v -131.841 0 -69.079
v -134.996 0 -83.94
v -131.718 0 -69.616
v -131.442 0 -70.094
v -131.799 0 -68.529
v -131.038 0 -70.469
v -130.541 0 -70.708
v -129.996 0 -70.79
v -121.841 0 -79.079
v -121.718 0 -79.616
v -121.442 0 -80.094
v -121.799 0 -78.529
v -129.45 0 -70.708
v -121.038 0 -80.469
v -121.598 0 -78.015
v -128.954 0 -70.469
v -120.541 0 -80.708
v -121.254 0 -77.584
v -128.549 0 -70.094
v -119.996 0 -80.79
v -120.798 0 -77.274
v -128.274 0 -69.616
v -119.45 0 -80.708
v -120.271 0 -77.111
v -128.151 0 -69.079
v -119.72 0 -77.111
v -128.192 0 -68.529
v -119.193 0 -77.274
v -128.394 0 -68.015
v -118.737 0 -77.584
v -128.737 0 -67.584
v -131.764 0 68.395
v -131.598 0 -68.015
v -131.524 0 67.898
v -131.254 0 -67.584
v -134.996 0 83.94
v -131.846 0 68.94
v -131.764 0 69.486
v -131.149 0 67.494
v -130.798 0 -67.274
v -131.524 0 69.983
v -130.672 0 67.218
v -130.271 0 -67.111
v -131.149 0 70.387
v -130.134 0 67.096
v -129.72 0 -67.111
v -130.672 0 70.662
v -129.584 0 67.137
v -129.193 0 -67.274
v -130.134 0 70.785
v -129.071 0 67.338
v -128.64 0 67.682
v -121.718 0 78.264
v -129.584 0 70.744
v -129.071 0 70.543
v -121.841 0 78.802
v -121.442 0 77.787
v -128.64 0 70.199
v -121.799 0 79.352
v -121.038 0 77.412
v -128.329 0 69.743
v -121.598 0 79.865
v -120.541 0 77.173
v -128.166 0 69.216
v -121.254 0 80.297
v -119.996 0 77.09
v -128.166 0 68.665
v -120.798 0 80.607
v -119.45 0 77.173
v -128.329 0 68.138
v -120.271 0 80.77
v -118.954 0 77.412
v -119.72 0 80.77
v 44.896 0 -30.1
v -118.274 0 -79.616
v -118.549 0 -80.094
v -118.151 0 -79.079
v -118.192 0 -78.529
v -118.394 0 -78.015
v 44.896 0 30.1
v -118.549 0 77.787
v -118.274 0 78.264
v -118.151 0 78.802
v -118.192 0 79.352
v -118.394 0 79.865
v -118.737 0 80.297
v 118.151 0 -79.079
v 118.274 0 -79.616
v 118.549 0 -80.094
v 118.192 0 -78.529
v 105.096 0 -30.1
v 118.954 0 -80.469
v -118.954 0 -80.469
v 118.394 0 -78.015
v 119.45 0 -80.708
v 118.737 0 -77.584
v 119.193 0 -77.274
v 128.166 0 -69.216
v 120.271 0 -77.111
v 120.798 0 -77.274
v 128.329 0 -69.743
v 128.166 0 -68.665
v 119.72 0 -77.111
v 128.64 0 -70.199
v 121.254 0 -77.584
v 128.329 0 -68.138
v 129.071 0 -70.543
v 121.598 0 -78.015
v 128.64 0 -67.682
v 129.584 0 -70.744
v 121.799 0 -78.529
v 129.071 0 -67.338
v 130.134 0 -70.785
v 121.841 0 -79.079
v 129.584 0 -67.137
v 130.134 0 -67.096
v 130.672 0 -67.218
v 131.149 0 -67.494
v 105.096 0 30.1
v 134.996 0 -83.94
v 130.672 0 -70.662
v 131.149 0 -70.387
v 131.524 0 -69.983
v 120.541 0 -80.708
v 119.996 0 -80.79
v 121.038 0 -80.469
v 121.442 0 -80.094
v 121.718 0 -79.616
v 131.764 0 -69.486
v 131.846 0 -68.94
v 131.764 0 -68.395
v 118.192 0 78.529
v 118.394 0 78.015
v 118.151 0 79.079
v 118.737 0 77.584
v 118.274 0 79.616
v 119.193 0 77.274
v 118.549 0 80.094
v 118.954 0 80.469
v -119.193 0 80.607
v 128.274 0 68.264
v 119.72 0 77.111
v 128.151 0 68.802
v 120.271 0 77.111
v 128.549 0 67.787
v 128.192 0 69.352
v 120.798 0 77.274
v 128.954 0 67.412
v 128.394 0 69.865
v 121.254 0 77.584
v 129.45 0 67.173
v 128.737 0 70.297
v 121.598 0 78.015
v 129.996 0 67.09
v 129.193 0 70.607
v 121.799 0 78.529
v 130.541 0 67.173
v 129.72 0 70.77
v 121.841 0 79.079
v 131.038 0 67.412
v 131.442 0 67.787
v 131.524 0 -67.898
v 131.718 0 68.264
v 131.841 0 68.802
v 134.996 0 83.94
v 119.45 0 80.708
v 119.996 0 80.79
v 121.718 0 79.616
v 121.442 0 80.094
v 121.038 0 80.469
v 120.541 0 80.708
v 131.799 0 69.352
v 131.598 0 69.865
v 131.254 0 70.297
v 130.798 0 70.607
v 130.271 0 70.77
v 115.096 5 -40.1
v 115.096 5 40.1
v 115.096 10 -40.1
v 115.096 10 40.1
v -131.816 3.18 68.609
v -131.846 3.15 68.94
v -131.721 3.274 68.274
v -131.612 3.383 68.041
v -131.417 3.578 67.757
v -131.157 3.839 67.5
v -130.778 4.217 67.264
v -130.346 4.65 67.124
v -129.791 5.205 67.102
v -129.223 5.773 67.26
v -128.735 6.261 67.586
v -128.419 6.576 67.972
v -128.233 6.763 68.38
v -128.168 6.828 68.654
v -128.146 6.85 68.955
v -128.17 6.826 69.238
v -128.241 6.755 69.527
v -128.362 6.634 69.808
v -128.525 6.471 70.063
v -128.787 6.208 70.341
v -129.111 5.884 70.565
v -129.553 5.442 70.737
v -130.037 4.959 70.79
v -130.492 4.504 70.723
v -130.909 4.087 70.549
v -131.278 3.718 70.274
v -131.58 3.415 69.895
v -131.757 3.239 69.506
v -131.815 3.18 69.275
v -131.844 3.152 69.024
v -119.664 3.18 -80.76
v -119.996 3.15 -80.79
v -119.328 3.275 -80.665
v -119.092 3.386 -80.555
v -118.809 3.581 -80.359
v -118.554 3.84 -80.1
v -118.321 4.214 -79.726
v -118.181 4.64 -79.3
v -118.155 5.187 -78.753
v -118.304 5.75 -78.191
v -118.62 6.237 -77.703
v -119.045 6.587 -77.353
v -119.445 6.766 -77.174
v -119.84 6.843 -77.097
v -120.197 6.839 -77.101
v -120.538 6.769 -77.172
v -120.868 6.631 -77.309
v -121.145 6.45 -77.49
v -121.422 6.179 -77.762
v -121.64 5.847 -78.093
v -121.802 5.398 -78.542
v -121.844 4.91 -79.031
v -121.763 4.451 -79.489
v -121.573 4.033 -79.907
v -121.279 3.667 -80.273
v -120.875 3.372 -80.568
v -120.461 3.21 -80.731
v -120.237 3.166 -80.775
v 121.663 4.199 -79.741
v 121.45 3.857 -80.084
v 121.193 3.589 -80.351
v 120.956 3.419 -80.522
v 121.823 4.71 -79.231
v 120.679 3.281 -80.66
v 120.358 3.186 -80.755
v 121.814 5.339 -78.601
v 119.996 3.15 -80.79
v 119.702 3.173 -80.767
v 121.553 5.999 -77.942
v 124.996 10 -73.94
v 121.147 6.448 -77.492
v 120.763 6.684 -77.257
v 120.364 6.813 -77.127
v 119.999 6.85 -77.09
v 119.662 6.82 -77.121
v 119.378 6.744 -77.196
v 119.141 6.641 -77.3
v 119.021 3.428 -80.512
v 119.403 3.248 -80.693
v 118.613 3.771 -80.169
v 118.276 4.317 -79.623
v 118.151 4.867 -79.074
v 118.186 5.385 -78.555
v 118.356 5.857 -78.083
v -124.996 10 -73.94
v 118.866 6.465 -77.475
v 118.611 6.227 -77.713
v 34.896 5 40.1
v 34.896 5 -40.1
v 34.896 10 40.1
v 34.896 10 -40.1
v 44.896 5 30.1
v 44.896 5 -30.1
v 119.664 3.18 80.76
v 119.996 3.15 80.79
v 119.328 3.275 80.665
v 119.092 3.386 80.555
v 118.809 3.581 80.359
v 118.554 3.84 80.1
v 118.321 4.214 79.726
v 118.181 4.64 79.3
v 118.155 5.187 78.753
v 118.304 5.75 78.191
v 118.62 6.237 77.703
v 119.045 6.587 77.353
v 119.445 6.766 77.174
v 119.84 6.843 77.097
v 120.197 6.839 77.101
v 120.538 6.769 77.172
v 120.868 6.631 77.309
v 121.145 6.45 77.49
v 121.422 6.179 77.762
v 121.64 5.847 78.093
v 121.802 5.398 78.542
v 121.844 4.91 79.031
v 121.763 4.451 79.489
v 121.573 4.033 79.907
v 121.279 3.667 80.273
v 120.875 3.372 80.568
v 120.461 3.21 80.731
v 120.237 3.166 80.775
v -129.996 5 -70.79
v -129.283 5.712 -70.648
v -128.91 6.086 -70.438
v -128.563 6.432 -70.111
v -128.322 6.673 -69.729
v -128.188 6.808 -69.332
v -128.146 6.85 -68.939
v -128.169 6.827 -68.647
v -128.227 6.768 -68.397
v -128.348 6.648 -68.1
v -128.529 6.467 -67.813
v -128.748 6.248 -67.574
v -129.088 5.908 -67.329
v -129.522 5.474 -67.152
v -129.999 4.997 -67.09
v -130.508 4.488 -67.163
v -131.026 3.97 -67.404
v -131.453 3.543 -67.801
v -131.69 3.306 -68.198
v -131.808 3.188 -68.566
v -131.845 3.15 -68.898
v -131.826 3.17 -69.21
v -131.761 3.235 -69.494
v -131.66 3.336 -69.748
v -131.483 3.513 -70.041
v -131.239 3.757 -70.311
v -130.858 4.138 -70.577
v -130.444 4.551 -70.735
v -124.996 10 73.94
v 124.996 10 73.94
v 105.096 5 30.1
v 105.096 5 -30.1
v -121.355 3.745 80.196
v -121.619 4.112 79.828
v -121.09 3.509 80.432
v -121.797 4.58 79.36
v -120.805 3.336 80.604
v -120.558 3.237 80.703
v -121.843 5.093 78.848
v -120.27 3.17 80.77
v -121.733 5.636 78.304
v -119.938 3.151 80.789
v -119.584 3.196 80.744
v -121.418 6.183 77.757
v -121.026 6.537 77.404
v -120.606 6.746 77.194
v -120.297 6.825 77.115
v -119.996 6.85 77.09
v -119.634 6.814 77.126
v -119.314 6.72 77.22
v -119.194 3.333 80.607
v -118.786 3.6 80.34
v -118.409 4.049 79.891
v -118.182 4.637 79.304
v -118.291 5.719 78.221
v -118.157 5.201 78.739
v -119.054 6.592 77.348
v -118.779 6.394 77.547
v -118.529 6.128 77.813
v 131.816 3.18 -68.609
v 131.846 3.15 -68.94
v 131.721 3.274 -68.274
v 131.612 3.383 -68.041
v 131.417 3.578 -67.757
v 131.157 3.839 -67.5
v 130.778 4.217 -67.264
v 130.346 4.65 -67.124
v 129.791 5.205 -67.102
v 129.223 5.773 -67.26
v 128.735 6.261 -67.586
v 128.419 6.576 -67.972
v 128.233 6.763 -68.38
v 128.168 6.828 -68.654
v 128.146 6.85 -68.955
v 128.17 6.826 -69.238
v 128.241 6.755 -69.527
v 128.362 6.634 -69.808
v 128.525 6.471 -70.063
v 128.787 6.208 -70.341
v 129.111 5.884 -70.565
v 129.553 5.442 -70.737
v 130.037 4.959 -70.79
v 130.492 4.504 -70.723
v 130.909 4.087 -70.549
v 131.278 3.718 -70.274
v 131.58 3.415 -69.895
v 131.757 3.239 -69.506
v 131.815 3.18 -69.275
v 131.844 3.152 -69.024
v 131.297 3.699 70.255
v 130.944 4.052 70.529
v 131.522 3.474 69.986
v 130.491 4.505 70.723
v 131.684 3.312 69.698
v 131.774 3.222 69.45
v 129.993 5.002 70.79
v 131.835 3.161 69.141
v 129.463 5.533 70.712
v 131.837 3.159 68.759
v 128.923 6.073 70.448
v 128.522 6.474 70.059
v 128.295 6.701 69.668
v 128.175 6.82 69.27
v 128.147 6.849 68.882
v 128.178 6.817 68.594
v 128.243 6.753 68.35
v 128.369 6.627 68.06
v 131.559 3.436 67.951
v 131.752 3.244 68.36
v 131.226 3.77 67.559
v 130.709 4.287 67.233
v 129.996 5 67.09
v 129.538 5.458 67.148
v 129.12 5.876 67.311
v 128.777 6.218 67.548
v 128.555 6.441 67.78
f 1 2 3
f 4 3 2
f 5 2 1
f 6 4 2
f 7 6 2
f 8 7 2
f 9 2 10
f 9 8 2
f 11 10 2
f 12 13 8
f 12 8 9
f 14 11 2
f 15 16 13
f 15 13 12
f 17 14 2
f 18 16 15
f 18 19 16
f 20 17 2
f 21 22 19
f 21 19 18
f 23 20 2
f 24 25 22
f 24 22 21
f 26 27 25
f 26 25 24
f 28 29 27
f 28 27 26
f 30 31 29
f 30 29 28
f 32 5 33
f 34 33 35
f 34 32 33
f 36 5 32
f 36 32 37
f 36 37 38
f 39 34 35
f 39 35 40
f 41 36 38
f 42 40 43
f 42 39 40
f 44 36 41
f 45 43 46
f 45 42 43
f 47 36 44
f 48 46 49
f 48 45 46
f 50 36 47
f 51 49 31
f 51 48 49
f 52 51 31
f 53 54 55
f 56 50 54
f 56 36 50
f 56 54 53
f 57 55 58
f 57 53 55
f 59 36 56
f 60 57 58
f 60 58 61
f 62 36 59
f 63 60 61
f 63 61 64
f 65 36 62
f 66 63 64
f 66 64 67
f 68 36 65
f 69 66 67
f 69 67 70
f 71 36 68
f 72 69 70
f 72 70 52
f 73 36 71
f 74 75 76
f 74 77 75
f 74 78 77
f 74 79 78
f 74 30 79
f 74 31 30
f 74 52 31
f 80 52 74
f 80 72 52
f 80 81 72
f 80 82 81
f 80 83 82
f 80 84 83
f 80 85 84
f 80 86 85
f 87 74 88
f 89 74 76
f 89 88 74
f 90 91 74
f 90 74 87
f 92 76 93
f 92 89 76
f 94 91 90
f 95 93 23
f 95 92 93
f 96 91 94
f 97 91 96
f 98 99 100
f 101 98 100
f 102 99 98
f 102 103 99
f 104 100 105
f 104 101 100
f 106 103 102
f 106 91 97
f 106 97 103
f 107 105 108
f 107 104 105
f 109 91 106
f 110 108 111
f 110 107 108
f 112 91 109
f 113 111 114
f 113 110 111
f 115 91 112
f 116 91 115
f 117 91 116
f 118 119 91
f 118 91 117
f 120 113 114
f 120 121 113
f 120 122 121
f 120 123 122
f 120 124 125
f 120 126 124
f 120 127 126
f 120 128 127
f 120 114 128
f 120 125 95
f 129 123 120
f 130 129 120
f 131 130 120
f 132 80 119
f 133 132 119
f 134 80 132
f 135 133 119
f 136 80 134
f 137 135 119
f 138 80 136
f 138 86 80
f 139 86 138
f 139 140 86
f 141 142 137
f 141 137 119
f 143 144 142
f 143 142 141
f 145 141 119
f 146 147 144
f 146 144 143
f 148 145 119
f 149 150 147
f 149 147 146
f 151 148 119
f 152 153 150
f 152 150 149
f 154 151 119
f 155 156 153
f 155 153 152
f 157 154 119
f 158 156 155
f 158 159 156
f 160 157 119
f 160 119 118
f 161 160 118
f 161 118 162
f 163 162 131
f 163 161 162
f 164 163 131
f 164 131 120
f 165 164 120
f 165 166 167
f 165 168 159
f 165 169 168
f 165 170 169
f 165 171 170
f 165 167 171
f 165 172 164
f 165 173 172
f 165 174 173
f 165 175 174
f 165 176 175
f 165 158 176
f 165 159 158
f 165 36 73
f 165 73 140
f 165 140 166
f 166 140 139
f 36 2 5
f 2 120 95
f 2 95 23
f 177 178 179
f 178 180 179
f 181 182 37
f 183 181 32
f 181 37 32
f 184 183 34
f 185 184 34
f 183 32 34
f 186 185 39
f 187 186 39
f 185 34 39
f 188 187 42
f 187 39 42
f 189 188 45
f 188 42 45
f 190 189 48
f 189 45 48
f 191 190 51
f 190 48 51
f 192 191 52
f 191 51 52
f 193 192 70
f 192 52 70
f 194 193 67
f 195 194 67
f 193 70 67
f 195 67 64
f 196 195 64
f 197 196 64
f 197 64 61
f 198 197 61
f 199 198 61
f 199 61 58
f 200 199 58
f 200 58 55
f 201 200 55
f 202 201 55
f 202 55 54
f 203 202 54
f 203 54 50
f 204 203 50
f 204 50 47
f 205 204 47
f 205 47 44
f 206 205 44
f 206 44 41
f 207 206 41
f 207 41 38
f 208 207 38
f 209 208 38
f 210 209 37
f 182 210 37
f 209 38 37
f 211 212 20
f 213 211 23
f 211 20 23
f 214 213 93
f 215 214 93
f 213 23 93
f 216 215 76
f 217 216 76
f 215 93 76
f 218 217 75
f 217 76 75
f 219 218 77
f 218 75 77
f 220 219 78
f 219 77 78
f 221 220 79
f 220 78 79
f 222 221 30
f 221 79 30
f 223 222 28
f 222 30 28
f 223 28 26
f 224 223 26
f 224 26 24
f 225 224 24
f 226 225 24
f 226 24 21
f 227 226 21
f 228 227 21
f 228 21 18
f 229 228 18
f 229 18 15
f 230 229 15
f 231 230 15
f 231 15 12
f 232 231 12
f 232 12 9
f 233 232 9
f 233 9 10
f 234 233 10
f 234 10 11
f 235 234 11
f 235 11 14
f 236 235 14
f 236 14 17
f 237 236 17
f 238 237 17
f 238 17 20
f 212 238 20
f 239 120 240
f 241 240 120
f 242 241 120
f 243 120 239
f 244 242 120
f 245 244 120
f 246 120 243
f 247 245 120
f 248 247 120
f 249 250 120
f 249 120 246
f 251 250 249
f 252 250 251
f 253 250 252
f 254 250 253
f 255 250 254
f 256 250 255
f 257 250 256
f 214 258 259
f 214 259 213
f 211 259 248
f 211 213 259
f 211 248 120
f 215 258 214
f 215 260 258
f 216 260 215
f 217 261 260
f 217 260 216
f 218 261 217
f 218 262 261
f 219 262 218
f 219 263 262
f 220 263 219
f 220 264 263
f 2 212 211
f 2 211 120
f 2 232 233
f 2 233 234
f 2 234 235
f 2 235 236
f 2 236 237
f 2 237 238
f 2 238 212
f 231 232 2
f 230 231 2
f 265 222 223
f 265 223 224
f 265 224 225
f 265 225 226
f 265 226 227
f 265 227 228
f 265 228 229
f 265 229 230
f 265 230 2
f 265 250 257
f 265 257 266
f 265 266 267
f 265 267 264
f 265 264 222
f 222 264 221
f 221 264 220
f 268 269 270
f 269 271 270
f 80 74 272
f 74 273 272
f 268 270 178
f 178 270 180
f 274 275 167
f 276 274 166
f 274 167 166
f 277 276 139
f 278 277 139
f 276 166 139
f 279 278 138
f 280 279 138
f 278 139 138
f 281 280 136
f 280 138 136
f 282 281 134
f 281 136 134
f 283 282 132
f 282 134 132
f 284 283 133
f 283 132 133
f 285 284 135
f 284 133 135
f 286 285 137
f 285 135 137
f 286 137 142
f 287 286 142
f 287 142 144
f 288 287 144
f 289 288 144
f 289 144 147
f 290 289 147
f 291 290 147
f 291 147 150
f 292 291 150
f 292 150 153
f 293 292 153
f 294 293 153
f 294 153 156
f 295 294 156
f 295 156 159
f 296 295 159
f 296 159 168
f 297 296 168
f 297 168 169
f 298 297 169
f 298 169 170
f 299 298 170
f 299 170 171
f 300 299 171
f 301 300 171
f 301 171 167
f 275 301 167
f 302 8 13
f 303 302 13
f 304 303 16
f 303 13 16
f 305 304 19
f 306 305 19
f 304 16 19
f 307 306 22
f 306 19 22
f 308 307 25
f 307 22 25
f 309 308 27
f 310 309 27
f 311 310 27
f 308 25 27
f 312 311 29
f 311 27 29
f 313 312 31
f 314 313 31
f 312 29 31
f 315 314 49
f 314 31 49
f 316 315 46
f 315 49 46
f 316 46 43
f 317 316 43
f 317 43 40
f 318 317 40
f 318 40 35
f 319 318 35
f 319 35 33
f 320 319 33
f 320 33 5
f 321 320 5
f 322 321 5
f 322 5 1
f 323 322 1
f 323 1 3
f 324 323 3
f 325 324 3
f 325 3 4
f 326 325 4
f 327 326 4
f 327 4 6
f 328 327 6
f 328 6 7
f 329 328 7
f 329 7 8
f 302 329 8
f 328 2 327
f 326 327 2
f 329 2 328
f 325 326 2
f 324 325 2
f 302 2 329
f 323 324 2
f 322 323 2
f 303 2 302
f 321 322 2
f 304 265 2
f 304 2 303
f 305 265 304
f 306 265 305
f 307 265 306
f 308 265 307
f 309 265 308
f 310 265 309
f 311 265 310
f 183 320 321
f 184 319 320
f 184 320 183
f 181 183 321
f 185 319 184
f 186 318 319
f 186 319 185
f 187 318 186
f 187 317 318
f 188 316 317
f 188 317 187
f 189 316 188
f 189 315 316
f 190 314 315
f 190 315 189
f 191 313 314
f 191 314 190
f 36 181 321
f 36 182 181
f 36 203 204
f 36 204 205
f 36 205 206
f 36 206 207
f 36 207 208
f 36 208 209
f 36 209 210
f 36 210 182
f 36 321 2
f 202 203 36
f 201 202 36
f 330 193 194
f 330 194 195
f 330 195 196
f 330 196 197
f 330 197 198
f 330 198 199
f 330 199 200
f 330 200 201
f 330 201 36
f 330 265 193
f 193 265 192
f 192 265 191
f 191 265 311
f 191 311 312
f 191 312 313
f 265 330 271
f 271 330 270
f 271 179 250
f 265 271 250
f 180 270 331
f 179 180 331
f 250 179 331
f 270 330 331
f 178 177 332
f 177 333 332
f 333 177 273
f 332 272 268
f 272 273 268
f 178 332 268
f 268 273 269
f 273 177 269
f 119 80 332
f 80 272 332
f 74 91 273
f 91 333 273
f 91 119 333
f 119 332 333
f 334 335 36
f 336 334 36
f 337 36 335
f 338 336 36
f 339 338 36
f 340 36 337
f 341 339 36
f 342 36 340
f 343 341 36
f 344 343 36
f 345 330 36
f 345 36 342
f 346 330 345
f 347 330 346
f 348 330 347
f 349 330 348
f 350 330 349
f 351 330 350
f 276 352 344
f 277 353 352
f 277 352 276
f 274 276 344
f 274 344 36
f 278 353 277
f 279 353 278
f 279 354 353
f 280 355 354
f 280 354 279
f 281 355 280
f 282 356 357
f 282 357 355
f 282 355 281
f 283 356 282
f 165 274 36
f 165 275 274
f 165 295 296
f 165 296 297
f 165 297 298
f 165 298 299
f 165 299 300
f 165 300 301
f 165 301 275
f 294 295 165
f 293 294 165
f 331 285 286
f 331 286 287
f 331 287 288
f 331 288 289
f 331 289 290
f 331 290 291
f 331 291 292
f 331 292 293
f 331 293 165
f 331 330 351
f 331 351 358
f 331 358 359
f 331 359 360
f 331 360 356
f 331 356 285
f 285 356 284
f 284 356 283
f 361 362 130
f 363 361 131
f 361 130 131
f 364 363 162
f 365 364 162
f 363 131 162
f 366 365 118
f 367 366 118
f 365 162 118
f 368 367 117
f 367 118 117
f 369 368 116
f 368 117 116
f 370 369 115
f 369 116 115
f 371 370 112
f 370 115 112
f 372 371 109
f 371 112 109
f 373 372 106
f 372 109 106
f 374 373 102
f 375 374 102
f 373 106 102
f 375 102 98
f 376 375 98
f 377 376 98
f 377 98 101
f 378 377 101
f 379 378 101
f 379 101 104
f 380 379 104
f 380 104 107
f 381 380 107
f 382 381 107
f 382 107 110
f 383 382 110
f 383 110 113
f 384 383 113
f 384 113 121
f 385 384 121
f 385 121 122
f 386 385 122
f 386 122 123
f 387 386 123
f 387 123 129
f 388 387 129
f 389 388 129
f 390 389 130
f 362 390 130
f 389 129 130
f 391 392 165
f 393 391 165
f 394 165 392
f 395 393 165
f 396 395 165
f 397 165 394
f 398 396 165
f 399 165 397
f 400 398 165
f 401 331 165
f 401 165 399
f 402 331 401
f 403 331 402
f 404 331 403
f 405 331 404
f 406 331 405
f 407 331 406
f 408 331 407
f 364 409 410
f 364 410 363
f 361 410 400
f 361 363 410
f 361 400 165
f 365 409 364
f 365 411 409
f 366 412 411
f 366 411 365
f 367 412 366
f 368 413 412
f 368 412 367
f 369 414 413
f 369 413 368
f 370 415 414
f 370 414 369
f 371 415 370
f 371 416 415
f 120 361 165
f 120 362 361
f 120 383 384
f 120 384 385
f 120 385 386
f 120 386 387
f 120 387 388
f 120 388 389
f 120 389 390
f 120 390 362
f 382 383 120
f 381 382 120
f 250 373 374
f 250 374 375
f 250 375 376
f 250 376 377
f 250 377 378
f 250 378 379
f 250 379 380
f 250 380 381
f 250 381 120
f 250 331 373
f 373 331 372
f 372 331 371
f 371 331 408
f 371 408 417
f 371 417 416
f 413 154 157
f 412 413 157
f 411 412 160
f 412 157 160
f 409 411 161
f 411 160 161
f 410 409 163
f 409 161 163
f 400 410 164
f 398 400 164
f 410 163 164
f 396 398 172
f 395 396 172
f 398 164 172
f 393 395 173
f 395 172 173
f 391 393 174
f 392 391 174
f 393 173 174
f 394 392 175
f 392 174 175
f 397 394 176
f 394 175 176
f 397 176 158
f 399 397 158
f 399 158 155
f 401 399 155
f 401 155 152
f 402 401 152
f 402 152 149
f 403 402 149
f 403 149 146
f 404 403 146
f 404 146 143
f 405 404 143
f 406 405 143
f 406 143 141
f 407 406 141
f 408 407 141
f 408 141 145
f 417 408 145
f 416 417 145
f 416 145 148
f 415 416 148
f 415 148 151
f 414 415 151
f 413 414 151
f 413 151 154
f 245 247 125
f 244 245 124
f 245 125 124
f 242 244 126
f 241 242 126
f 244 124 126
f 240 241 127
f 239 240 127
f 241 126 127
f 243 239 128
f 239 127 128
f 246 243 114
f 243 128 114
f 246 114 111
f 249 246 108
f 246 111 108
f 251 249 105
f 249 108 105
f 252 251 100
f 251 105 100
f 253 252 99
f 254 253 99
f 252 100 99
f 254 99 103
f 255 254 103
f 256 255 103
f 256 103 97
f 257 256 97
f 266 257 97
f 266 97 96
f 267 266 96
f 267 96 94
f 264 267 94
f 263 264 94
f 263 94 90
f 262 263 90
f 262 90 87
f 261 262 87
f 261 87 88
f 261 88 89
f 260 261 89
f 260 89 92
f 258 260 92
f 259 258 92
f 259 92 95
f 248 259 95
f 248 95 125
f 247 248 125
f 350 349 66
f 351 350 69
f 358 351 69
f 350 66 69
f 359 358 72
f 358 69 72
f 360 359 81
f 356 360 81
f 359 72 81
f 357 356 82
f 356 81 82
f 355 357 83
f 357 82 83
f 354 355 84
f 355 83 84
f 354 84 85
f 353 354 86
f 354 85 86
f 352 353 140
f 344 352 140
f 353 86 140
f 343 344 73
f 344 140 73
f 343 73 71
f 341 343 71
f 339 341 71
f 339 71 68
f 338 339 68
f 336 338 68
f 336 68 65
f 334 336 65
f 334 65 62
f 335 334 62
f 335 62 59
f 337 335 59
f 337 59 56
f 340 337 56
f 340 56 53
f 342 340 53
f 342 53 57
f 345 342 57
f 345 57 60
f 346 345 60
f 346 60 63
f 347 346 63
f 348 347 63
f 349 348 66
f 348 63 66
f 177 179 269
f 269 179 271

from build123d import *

# Parameters (mm, degrees)
SKETCH_3_R          = 1.85
CUT_EXTRUDE_1_DEPTH = 160.279136005


with BuildPart() as part:
    # Эскиз1 → Loft 1 section 0
    with BuildSketch(Plane(origin=(0, 0, 0), x_dir=(1, 0, 0), z_dir=(0, 1, 0))):
        with BuildLine():
            Line((-134.995764294, -83.940376122), (134.995764294, -83.940376122))
            Line((134.995764294, -83.940376122), (134.995764294, 83.940376122))
            Line((134.995764294, 83.940376122), (-134.995764294, 83.940376122))
            Line((-134.995764294, 83.940376122), (-134.995764294, -83.940376122))
        make_face()
    # Эскиз2 → Loft 1 section 1
    with BuildSketch(Plane(origin=(0, 10, 0), x_dir=(1, 0, 0), z_dir=(0, 1, 0))):
        with BuildLine():
            Line((-124.995764294, 73.940376122), (-124.995764294, -73.940376122))
            Line((-124.995764294, -73.940376122), (124.995764294, -73.940376122))
            Line((124.995764294, -73.940376122), (124.995764294, 73.940376122))
            Line((124.995764294, 73.940376122), (-124.995764294, 73.940376122))
        make_face()
    loft()

    # Эскиз3 → Вырез-Вытянуть1 (cut, through all)
    with BuildSketch(Plane.XZ):
        with Locations(Location((-119.995764294, 78.940376122, 0), (0, 0, 270))):
            Circle(SKETCH_3_R)
        with Locations(Location((-129.995764294, 68.940376122, 0), (0, 0, 180))):
            Circle(SKETCH_3_R)
        with Locations(Location((129.995764294, 68.940376122, 0), (0, 0, 270))):
            Circle(SKETCH_3_R)
        with Locations(Location((119.995764294, 78.940376122, 0), (0, 0, 90))):
            Circle(SKETCH_3_R)
        with Locations((129.995764294, -68.940376122)):
            Circle(SKETCH_3_R)
        with Locations(Location((119.995764294, -78.940376122, 0), (0, 0, 270))):
            Circle(SKETCH_3_R)
        with Locations(Location((-129.995764294, -68.940376122, 0), (0, 0, 270))):
            Circle(SKETCH_3_R)
        with Locations(Location((-119.995764294, -78.940376122, 0), (0, 0, 270))):
            Circle(SKETCH_3_R)
    extrude(amount=-CUT_EXTRUDE_1_DEPTH, mode=Mode.SUBTRACT)

    # Эскиз7 → Loft 1 2 section 0
    with BuildSketch(Plane(origin=(0, 0, 0), x_dir=(1, 0, 0), z_dir=(0, 1, 0))):
        with BuildLine():
            Line((105.095764294, -30.1), (105.095764294, 30.1))
            Line((105.095764294, 30.1), (44.895764294, 30.1))
            Line((44.895764294, 30.1), (44.895764294, -30.1))
            Line((44.895764294, -30.1), (105.095764294, -30.1))
        make_face()
    # Эскиз6 → Loft 1 2 section 1
    with BuildSketch(Plane(origin=(0, 5, 0), x_dir=(1, 0, 0), z_dir=(0, 1, 0))):
        with BuildLine():
            Line((105.095764294, -30.1), (44.895764294, -30.1))
            Line((44.895764294, -30.1), (44.895764294, 30.1))
            Line((44.895764294, 30.1), (105.095764294, 30.1))
            Line((105.095764294, 30.1), (105.095764294, -30.1))
        make_face()
    loft(mode=Mode.SUBTRACT)

    # Эскиз6<3> → Вырез-По сечениям2 section 0
    with BuildSketch(Plane(origin=(0, 5, 0), x_dir=(1, 0, 0), z_dir=(0, 1, 0))):
        with BuildLine():
            Line((115.095764294, 40.1), (34.895764294, 40.1))
            Line((34.895764294, 40.1), (34.895764294, -40.1))
            Line((34.895764294, -40.1), (115.095764294, -40.1))
            Line((115.095764294, -40.1), (115.095764294, 40.1))
        make_face()
    # Эскиз4 → Вырез-По сечениям2 section 1
    with BuildSketch(Plane(origin=(0, 10, 0), x_dir=(1, 0, 0), z_dir=(0, 1, 0))):
        with BuildLine():
            Line((115.095764294, -40.1), (34.895764294, -40.1))
            Line((34.895764294, -40.1), (34.895764294, 40.1))
            Line((34.895764294, 40.1), (115.095764294, 40.1))
            Line((115.095764294, 40.1), (115.095764294, -40.1))
        make_face()
    loft(mode=Mode.SUBTRACT)


solid = part.part
